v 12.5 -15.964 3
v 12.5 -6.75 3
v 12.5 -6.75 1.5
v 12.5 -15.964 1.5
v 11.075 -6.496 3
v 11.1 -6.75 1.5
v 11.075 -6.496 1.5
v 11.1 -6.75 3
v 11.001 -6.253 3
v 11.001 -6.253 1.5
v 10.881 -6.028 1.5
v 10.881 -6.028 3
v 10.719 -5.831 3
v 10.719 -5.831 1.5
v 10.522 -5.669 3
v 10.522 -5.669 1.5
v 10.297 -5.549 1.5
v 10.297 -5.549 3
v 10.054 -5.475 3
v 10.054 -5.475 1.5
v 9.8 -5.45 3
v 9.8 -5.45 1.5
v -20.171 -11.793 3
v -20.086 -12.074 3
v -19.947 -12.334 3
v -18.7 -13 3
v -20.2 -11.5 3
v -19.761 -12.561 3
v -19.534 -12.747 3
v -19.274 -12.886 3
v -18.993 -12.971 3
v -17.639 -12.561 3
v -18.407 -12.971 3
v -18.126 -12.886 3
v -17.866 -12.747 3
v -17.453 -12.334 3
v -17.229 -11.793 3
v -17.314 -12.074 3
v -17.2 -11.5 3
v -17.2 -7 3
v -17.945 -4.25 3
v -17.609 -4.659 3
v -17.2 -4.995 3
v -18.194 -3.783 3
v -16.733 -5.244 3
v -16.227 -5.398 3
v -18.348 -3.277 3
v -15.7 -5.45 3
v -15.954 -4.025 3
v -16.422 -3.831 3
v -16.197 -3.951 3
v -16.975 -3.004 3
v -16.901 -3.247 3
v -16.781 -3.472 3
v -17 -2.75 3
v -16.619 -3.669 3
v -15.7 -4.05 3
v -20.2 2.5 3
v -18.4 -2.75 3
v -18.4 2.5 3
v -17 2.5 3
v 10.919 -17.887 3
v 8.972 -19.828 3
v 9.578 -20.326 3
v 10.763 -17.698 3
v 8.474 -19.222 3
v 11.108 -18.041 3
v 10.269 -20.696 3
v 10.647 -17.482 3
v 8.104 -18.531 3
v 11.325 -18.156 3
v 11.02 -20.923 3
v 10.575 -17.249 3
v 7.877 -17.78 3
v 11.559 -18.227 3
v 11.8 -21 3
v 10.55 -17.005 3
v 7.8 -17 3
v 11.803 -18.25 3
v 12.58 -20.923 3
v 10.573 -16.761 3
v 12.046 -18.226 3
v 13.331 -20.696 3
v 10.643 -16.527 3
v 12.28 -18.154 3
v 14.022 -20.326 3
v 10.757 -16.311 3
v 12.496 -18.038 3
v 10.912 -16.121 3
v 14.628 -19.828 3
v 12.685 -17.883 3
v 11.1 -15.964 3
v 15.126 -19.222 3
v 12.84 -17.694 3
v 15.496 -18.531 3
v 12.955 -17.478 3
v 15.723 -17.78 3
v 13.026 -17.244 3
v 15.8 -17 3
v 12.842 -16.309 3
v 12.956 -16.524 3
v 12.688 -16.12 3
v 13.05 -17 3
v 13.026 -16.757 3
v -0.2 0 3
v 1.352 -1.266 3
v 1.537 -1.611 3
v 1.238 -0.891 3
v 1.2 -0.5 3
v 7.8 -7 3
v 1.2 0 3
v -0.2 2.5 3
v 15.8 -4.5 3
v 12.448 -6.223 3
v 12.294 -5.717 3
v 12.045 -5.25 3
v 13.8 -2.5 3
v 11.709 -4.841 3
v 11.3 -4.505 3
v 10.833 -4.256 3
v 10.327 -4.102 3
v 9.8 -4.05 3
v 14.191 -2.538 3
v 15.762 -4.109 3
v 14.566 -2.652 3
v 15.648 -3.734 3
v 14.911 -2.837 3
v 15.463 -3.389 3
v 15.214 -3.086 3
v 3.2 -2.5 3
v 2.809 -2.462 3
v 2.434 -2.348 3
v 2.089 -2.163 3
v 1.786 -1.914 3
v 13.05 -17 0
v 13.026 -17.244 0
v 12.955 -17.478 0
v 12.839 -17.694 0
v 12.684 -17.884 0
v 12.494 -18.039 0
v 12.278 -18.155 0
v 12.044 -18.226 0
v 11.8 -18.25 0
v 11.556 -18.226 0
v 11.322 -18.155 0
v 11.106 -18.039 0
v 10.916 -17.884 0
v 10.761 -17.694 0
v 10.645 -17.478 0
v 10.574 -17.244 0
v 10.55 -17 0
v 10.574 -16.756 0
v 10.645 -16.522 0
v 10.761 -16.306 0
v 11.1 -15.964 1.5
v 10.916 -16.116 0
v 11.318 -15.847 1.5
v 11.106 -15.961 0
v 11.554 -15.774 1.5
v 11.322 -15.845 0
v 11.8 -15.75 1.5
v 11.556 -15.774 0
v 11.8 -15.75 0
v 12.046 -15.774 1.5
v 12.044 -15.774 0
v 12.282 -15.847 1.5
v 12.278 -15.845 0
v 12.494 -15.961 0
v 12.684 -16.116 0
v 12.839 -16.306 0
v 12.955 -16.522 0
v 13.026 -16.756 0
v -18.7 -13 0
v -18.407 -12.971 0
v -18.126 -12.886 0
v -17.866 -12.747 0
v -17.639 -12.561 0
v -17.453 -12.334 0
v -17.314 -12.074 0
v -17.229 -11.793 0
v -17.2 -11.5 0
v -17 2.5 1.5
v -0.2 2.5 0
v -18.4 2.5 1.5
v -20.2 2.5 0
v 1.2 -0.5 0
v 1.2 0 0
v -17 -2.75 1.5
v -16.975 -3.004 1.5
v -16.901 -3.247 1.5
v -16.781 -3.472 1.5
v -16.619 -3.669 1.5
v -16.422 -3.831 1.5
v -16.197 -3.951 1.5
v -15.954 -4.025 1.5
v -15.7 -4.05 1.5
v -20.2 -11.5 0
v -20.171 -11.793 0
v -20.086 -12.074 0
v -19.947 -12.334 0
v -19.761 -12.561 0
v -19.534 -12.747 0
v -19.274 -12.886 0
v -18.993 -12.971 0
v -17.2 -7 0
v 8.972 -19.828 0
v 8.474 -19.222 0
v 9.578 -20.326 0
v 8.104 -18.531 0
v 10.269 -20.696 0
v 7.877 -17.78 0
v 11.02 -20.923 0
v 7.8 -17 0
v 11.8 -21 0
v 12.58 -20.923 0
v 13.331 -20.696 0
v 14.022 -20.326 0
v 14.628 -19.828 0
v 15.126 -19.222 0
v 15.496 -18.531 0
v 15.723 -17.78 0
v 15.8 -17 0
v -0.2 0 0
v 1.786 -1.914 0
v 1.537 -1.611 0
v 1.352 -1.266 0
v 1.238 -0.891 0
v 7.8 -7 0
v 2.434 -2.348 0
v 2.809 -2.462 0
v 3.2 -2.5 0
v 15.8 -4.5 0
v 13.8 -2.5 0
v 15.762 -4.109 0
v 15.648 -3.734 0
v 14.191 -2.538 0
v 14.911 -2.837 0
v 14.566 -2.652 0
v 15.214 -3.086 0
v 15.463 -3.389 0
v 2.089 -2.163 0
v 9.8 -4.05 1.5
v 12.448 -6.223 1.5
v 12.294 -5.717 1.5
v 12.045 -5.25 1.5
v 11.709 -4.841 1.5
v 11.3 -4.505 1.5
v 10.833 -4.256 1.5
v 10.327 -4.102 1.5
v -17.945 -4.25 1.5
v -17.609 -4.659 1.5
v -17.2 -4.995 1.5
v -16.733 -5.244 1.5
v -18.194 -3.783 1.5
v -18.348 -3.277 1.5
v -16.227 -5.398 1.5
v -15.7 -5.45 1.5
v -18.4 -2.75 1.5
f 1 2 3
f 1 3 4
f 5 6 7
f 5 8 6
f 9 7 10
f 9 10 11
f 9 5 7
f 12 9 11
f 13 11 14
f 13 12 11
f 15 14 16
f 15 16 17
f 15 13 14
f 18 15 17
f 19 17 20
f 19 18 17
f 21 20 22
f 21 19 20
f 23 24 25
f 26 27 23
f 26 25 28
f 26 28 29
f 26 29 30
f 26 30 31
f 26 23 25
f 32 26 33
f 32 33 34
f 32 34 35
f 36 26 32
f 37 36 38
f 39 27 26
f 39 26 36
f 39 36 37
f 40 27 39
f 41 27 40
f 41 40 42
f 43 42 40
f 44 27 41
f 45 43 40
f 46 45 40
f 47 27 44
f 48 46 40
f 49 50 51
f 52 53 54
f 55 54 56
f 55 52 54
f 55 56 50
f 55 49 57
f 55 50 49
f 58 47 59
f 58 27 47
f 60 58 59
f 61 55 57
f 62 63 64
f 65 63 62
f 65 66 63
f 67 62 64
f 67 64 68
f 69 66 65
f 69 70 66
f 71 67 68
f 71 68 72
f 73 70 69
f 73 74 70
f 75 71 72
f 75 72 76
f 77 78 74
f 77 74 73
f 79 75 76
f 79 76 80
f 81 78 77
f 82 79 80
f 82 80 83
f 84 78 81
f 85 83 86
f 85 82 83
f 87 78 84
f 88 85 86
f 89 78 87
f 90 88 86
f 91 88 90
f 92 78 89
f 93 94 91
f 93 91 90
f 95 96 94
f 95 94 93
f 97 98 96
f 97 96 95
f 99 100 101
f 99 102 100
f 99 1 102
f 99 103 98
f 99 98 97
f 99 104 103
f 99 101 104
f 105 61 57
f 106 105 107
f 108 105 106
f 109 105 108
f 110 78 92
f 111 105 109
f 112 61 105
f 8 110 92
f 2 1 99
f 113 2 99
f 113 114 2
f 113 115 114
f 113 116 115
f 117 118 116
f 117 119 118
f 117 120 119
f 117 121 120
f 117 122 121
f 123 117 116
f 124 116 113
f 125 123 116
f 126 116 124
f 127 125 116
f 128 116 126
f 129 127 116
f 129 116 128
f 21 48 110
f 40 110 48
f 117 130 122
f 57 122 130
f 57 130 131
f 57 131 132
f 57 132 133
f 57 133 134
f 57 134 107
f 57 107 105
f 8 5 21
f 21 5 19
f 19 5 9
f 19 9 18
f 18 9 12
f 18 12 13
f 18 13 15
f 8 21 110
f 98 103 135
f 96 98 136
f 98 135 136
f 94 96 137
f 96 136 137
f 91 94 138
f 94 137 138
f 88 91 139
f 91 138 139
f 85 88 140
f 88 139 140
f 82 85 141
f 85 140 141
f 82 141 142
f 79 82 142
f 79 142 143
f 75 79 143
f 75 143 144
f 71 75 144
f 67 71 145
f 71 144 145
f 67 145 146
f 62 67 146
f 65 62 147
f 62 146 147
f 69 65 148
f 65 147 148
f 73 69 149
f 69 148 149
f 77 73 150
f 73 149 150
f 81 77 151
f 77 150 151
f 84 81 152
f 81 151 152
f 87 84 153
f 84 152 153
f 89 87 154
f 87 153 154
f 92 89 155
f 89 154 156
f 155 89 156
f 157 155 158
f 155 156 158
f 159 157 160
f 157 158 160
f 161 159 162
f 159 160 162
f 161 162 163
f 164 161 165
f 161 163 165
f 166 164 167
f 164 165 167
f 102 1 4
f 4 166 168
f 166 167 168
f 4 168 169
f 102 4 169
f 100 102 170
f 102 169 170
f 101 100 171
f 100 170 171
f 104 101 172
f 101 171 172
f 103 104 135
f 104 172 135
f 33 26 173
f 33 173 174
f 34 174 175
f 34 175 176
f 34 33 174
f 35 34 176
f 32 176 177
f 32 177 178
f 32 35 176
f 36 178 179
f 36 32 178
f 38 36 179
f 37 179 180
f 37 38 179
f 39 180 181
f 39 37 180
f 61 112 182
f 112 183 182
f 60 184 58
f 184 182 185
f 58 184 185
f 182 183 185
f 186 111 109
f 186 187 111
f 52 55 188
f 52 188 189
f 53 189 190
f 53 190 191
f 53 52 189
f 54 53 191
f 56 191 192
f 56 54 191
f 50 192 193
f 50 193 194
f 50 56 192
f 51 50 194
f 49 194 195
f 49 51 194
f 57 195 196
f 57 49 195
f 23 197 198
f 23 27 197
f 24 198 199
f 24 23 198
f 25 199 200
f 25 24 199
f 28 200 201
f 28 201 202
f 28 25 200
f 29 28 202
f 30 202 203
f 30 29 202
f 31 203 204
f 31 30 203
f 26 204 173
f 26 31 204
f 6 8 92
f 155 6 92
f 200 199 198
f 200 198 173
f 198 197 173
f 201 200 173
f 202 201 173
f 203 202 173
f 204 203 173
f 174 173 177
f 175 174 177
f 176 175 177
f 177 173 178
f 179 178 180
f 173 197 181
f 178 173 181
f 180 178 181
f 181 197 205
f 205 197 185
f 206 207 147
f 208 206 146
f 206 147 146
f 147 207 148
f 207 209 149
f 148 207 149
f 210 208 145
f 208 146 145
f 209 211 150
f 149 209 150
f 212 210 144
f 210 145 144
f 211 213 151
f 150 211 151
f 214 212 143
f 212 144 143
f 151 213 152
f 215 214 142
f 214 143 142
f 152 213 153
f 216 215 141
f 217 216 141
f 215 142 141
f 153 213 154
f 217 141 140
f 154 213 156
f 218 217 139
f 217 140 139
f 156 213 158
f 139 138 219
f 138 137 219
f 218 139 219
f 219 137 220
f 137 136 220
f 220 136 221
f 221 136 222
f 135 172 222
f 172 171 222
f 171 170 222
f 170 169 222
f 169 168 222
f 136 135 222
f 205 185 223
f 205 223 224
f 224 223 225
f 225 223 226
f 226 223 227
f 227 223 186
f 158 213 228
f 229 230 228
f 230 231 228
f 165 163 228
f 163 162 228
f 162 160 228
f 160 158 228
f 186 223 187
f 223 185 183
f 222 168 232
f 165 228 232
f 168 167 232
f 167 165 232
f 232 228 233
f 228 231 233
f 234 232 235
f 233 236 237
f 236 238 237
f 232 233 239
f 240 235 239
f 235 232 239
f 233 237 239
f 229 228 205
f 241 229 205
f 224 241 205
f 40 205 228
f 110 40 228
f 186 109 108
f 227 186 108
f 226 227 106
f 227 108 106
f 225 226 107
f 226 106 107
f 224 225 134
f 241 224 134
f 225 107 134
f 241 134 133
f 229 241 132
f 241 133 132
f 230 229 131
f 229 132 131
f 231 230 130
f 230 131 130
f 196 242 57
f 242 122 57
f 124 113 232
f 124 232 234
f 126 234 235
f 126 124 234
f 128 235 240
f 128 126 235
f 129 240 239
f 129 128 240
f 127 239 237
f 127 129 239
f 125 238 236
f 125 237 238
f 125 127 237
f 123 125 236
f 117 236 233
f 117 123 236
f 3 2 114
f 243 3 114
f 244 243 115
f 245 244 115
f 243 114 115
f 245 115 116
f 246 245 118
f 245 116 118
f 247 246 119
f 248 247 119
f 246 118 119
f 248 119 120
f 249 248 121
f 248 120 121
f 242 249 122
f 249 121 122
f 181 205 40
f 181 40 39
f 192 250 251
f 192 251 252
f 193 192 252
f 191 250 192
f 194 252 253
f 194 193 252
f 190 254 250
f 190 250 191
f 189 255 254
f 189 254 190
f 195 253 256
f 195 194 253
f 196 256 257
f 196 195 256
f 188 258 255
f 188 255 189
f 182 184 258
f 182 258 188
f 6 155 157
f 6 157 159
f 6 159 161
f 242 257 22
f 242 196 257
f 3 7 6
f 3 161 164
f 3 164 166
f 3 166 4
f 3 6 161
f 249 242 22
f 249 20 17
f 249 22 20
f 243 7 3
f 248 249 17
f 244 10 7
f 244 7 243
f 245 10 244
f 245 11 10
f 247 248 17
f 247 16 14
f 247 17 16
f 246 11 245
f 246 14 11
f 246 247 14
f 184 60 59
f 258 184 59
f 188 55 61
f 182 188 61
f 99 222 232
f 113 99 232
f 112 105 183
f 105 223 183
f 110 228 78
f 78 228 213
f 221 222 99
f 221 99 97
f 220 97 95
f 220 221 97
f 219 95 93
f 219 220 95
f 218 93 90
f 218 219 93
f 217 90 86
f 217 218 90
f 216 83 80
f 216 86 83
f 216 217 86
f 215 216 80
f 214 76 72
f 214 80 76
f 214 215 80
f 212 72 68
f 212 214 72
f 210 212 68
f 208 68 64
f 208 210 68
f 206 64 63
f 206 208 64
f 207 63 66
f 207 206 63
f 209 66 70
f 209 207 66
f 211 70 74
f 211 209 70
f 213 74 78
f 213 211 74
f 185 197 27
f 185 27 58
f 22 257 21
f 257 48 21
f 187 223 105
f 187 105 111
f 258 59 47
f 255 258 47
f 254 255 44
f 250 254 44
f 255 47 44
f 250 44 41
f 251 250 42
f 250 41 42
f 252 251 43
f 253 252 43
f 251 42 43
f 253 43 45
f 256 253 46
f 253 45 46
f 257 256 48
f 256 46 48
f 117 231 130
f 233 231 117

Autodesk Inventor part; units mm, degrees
ref_plane "YZ Plane" through (0, 0, 0) normal (1, 0, 0) x (0, 1, 0)
ref_plane "XZ Plane" through (0, 0, 0) normal (0, 1, 0) x (-1, 0, 0)
ref_plane "XY Plane" through (0, 0, 0) normal (0, 0, 1) x (1, 0, 0)
sketch "Эскиз1" plane through (0, 0, 0) normal (0, 0, 1) x (1, 0, 0)
  line L0 (-0.2, 0) -> (-0.2, 2.5)
  line L1 (-0.2, 2.5) -> (-20.2, 2.5)
  line L2 (-20.2, 0) -> (-20.2, 2.5)
  line L3 (-0.2, 0) -> (1.2, 0)
  line L4 (1.2, 0) -> (1.2, -3.5)
  line L5 (-20.2, -13) -> (-17.2, -13)
  line L6 (-17.2, -7) -> (7.8, -7)
  line L7 (7.8, -13) -> (15.8, -13)
  line L8 (15.8, -3.5) -> (1.2, -3.5)
  line L9 (7.8, -13) -> (7.8, -17)
  line L10 (15.8, -17) -> (15.8, -13)
  arc A0 (7.8, -17) -> (15.8, -17) centre (11.8, -17) ccw
  circle A1 centre (11.8, -17) radius 1.25
  line L11 (15.8, -13) -> (15.8, -3.5)
  line L12 (7.8, -7) -> (7.8, -13)
  line L13 (-17.2, -7) -> (-17.2, -13)
  line L14 (-20.2, -13) -> (-20.2, 0)
  line L15 (-6.1183, 2.5) -> (-8.8117, 2.5)
  point P0 (0, 0)
  dimension "d0" = 2.5
extrude "Выдавливание1" add sketch "Эскиз1" along normal blind 3
sketch "Эскиз2" plane through (1.2, -3.5, 0) normal (0, 1, 0) x (1, 0, 0)
  line L0 (11.85, 0) -> (11.85, -3) projected
  line L1 (14.6, 0) -> (0, 0) projected
  line L2 (0, 0) -> (0, -3) projected
  line L3 (14.6, -3) -> (0, -3) projected
  line L4 (14.6, 0) -> (14.6, -3) projected
  point P0 (-1.2, 0)
extrude "Выдавливание2" add sketch "Эскиз2" along normal blind 1
fillet "Сопряжение1" radius 2 2 edges at (15.8, -2.5, 1.5) (1.2, -2.5, 1.5)
fillet "Сопряжение1" radius 1.5 2 edges at (-17.2, -13, 1.5) (-20.2, -13, 1.5)
sketch "Эскиз3" plane through (0, 0, 3) normal (0, 0, 1) x (1, 0, 0)
  line L0 (-18.4, 2.5) -> (-18.4, -2.75)
  arc A0 (-18.4, -2.75) -> (-15.7, -5.45) centre (-15.7, -2.75) ccw
  line L1 (-15.7, -5.45) -> (9.8, -5.45)
  arc A1 (11.1, -6.75) -> (9.8, -5.45) centre (9.8, -6.75) ccw
  line L2 (11.1, -6.75) -> (11.1, -15.75)
  line L3 (12.5, -15.75) -> (12.5, -6.75)
  arc A2 (12.5, -6.75) -> (9.8, -4.05) centre (9.8, -6.75) ccw
  line L4 (9.8, -4.05) -> (-15.7, -4.05)
  arc A3 (-17, -2.75) -> (-15.7, -4.05) centre (-15.7, -2.75) ccw
  line L5 (-17, -2.75) -> (-17, 2.5)
  line L6 (-17, 2.5) -> (-18.4, 2.5)
  line L7 (12.5, -15.75) -> (12.5, -17.0201)
  line L8 (12.5, -17.0201) -> (11.1, -17.0201)
  line L9 (11.1, -17.0201) -> (11.1, -15.75)
  point P0 (0, 0)
extrude "Выдавливание3" cut sketch "Эскиз3" against normal blind 1.5
properties part number "RackeSecondaryStacring"
